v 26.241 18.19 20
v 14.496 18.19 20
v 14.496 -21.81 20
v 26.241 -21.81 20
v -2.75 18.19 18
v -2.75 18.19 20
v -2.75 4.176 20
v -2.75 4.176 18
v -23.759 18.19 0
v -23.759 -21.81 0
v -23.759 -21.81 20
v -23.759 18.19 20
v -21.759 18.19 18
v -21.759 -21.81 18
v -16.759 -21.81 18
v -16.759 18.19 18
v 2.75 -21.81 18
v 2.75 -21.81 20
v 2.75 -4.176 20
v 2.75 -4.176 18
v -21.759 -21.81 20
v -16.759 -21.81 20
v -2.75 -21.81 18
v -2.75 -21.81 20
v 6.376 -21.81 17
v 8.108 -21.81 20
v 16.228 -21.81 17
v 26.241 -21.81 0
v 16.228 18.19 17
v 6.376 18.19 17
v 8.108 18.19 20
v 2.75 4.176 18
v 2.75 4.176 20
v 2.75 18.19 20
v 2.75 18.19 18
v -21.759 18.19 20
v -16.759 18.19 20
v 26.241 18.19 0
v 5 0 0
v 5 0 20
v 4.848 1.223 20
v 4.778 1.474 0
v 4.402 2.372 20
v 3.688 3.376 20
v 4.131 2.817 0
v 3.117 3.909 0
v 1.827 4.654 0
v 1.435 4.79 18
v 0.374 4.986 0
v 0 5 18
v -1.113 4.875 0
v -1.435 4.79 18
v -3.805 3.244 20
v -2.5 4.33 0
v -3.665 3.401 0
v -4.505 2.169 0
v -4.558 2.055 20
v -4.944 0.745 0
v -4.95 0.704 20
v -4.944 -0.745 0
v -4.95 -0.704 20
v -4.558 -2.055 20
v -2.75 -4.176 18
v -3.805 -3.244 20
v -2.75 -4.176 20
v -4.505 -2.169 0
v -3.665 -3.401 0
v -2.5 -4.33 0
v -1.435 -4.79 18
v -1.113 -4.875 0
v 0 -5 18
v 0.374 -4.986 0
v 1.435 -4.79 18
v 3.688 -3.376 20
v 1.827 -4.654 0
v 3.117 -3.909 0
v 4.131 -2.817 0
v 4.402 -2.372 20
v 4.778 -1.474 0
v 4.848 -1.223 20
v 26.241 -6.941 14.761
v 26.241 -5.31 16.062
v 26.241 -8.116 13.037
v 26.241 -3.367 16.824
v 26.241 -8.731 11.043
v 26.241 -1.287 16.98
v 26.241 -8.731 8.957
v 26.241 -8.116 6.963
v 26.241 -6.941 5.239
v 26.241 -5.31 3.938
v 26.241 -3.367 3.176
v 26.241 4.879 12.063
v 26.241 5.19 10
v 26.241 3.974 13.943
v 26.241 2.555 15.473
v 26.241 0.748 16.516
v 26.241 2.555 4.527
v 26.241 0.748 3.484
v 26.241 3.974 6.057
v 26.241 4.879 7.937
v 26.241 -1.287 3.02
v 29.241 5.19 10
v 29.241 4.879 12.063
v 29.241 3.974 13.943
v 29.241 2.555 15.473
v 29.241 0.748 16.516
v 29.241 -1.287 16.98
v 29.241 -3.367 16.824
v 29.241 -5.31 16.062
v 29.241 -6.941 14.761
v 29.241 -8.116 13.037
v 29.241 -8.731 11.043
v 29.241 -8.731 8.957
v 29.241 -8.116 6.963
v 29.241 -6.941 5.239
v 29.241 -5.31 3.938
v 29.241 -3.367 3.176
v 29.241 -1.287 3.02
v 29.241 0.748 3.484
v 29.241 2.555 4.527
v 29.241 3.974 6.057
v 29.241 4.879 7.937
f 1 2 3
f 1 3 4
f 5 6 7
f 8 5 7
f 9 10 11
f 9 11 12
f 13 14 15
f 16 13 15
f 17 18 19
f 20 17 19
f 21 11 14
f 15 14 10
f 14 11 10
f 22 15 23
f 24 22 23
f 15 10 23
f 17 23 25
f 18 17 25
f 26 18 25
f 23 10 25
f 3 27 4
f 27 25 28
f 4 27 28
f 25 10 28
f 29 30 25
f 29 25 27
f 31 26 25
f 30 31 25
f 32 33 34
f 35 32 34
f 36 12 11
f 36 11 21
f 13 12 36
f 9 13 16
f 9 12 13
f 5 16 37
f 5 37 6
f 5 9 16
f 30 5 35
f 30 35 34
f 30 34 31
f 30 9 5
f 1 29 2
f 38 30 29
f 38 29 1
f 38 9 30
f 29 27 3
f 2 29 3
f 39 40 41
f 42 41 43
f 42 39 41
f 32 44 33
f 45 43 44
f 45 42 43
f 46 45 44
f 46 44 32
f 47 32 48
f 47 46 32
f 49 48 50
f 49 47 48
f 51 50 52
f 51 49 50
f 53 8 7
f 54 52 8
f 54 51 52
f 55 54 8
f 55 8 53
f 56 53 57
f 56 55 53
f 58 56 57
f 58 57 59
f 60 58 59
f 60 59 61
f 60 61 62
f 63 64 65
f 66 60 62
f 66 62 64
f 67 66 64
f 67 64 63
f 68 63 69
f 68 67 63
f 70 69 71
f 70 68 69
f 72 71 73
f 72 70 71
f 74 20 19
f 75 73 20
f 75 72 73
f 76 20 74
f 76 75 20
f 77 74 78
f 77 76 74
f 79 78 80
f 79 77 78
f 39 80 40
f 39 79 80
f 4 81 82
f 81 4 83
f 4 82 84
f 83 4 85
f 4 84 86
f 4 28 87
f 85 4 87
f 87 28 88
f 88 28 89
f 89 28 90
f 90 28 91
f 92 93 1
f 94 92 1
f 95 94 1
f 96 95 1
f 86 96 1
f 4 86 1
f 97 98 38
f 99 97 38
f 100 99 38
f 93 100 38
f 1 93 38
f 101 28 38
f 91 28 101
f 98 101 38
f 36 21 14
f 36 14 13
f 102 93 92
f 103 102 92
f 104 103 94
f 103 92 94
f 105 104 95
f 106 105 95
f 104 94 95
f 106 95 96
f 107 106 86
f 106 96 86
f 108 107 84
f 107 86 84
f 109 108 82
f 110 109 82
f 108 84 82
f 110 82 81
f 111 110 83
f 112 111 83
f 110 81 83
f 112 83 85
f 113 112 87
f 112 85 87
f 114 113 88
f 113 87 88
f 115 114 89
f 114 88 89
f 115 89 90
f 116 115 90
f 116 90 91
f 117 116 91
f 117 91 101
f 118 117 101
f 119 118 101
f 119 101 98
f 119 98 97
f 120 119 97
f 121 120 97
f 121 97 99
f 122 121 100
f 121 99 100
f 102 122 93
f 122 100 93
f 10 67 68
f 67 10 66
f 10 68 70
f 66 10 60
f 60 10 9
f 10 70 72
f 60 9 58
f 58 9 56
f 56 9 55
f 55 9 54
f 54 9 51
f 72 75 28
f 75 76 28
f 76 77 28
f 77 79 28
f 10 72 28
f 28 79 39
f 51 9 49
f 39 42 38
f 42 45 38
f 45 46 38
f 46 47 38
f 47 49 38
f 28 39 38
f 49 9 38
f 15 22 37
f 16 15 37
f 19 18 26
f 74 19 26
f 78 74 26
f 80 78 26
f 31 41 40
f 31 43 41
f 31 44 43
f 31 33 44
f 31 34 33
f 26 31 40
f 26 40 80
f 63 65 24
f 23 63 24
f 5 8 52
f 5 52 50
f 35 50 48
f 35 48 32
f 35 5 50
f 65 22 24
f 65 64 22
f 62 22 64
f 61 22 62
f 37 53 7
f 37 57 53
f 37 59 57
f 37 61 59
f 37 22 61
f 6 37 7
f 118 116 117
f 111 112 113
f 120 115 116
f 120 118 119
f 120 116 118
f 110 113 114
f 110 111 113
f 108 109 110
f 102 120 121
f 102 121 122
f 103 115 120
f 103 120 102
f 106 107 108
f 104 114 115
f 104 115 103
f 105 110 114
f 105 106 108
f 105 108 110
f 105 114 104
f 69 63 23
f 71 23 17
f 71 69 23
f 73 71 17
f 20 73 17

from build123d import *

# Parameters (mm, degrees)
F0_W     = 50
F0_H     = 40
F0_R     = 5
F1_DEPTH = 20
F2_W     = 5
F2_H     = 40
F3_DEPTH = 2
F5_DEPTH = 40.001
F6_R     = 7
F7_DEPTH = 3


with BuildPart() as f1:
    # F0 (on Top) → F1 (new body)
    with BuildSketch(Plane.XY):
        with Locations((1.241206, -1.809668)):
            Rectangle(F0_W, F0_H)
        Circle(F0_R, mode=Mode.SUBTRACT)
    extrude(amount=F1_DEPTH)

    # F2 (on face) → F3 (cut)
    with BuildSketch(Plane.XY.offset(20)):
        with Locations((-19.258794, -1.809668)):
            Rectangle(F2_W, F2_H)
        with BuildLine():
            Line((-2.75, -4.175823), (-2.75, -21.809668))
            Line((-2.75, -21.809668), (2.75, -21.809668))
            Line((2.75, -21.809668), (2.75, -4.175823))
            ThreePointArc((2.75, -4.175823), (0, -5), (-2.75, -4.175823))
        make_face()
        with BuildLine():
            Line((2.75, 18.190332), (-2.75, 18.190332))
            Line((-2.75, 18.190332), (-2.75, 4.175823))
            ThreePointArc((-2.75, 4.175823), (0, 5), (2.75, 4.175823))
            Line((2.75, 4.175823), (2.75, 18.190332))
        make_face()
    extrude(amount=-F3_DEPTH, mode=Mode.SUBTRACT)

    # F4 (on face) → F5 (cut, through all)
    with BuildSketch(Plane.XZ.offset(21.809668)):
        Polygon((14.495603, 20), (8.107771, 20), (6.37572, 17), (16.227654, 17), align=None)
    extrude(amount=-F5_DEPTH, mode=Mode.SUBTRACT)

    # F6 (on face) → F7 (join)
    with BuildSketch(Plane.YZ.offset(26.241206)):
        with Locations((-1.809668, 10)):
            Circle(F6_R)
    extrude(amount=F7_DEPTH)


solid = f1.part
